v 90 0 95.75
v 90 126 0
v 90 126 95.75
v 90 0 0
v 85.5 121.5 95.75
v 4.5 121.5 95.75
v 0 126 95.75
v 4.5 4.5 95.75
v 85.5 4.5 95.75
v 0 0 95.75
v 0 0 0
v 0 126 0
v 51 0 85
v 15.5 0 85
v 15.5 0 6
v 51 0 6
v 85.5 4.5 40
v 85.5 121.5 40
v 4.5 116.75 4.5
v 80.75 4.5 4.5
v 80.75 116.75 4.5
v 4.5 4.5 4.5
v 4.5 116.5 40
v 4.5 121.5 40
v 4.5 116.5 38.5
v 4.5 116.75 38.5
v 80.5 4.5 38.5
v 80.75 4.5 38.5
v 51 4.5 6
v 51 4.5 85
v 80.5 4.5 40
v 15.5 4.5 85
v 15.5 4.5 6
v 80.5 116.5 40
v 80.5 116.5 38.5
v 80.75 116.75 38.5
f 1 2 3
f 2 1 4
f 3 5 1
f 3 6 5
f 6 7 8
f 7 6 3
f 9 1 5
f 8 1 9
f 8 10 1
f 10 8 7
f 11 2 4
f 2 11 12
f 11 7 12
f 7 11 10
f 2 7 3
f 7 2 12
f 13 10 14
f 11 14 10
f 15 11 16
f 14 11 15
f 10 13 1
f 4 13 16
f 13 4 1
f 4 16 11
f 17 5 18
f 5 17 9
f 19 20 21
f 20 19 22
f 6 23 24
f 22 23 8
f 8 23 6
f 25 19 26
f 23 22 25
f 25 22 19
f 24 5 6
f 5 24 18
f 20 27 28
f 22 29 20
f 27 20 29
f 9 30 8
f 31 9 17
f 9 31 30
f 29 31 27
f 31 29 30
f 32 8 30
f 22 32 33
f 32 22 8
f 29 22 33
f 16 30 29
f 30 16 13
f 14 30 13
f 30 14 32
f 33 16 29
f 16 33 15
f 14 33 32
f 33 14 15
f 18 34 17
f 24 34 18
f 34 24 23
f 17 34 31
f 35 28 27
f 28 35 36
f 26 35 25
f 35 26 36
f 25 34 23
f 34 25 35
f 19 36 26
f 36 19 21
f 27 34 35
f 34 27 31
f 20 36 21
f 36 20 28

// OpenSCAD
room_width = 81;
room_depth = 117;
room_height = 91.25;
wall_thickness = 4.5;

module room() {
  difference() {
    cube([
      room_width + (2 * wall_thickness),
      room_depth + (2 * wall_thickness),
      room_height + wall_thickness
    ]);
    translate([
      wall_thickness,
      wall_thickness,
      wall_thickness
    ])
      cube([
        room_width,
        room_depth,
        room_height + wall_thickness
      ]);
  }
}

module door() {
  cube([
    35.5,
    wall_thickness + 1,
    79,
  ]);
}

module ledge(length) {
  union() {
    translate([0, 0, 34])
      cube([
        length,
        5,
        1.5
      ]);
    cube([
      length,
      4.75,
      34
    ]);
  }
}


module office() {
  difference() {
    room();
    translate([
      wall_thickness + 11,
      -0.5,
      wall_thickness + 1.5
    ])
      door();
  }
  union() {
    rotate([0, 0, 180])
      translate([
        -(room_width + wall_thickness),
        -(room_depth + wall_thickness),
        wall_thickness
      ])
      ledge(room_width);
    rotate([0, 0, 90])
      translate([
        wall_thickness,
        -(room_width + wall_thickness),
        wall_thickness
      ])
      ledge(room_depth);
  }
}

office();
